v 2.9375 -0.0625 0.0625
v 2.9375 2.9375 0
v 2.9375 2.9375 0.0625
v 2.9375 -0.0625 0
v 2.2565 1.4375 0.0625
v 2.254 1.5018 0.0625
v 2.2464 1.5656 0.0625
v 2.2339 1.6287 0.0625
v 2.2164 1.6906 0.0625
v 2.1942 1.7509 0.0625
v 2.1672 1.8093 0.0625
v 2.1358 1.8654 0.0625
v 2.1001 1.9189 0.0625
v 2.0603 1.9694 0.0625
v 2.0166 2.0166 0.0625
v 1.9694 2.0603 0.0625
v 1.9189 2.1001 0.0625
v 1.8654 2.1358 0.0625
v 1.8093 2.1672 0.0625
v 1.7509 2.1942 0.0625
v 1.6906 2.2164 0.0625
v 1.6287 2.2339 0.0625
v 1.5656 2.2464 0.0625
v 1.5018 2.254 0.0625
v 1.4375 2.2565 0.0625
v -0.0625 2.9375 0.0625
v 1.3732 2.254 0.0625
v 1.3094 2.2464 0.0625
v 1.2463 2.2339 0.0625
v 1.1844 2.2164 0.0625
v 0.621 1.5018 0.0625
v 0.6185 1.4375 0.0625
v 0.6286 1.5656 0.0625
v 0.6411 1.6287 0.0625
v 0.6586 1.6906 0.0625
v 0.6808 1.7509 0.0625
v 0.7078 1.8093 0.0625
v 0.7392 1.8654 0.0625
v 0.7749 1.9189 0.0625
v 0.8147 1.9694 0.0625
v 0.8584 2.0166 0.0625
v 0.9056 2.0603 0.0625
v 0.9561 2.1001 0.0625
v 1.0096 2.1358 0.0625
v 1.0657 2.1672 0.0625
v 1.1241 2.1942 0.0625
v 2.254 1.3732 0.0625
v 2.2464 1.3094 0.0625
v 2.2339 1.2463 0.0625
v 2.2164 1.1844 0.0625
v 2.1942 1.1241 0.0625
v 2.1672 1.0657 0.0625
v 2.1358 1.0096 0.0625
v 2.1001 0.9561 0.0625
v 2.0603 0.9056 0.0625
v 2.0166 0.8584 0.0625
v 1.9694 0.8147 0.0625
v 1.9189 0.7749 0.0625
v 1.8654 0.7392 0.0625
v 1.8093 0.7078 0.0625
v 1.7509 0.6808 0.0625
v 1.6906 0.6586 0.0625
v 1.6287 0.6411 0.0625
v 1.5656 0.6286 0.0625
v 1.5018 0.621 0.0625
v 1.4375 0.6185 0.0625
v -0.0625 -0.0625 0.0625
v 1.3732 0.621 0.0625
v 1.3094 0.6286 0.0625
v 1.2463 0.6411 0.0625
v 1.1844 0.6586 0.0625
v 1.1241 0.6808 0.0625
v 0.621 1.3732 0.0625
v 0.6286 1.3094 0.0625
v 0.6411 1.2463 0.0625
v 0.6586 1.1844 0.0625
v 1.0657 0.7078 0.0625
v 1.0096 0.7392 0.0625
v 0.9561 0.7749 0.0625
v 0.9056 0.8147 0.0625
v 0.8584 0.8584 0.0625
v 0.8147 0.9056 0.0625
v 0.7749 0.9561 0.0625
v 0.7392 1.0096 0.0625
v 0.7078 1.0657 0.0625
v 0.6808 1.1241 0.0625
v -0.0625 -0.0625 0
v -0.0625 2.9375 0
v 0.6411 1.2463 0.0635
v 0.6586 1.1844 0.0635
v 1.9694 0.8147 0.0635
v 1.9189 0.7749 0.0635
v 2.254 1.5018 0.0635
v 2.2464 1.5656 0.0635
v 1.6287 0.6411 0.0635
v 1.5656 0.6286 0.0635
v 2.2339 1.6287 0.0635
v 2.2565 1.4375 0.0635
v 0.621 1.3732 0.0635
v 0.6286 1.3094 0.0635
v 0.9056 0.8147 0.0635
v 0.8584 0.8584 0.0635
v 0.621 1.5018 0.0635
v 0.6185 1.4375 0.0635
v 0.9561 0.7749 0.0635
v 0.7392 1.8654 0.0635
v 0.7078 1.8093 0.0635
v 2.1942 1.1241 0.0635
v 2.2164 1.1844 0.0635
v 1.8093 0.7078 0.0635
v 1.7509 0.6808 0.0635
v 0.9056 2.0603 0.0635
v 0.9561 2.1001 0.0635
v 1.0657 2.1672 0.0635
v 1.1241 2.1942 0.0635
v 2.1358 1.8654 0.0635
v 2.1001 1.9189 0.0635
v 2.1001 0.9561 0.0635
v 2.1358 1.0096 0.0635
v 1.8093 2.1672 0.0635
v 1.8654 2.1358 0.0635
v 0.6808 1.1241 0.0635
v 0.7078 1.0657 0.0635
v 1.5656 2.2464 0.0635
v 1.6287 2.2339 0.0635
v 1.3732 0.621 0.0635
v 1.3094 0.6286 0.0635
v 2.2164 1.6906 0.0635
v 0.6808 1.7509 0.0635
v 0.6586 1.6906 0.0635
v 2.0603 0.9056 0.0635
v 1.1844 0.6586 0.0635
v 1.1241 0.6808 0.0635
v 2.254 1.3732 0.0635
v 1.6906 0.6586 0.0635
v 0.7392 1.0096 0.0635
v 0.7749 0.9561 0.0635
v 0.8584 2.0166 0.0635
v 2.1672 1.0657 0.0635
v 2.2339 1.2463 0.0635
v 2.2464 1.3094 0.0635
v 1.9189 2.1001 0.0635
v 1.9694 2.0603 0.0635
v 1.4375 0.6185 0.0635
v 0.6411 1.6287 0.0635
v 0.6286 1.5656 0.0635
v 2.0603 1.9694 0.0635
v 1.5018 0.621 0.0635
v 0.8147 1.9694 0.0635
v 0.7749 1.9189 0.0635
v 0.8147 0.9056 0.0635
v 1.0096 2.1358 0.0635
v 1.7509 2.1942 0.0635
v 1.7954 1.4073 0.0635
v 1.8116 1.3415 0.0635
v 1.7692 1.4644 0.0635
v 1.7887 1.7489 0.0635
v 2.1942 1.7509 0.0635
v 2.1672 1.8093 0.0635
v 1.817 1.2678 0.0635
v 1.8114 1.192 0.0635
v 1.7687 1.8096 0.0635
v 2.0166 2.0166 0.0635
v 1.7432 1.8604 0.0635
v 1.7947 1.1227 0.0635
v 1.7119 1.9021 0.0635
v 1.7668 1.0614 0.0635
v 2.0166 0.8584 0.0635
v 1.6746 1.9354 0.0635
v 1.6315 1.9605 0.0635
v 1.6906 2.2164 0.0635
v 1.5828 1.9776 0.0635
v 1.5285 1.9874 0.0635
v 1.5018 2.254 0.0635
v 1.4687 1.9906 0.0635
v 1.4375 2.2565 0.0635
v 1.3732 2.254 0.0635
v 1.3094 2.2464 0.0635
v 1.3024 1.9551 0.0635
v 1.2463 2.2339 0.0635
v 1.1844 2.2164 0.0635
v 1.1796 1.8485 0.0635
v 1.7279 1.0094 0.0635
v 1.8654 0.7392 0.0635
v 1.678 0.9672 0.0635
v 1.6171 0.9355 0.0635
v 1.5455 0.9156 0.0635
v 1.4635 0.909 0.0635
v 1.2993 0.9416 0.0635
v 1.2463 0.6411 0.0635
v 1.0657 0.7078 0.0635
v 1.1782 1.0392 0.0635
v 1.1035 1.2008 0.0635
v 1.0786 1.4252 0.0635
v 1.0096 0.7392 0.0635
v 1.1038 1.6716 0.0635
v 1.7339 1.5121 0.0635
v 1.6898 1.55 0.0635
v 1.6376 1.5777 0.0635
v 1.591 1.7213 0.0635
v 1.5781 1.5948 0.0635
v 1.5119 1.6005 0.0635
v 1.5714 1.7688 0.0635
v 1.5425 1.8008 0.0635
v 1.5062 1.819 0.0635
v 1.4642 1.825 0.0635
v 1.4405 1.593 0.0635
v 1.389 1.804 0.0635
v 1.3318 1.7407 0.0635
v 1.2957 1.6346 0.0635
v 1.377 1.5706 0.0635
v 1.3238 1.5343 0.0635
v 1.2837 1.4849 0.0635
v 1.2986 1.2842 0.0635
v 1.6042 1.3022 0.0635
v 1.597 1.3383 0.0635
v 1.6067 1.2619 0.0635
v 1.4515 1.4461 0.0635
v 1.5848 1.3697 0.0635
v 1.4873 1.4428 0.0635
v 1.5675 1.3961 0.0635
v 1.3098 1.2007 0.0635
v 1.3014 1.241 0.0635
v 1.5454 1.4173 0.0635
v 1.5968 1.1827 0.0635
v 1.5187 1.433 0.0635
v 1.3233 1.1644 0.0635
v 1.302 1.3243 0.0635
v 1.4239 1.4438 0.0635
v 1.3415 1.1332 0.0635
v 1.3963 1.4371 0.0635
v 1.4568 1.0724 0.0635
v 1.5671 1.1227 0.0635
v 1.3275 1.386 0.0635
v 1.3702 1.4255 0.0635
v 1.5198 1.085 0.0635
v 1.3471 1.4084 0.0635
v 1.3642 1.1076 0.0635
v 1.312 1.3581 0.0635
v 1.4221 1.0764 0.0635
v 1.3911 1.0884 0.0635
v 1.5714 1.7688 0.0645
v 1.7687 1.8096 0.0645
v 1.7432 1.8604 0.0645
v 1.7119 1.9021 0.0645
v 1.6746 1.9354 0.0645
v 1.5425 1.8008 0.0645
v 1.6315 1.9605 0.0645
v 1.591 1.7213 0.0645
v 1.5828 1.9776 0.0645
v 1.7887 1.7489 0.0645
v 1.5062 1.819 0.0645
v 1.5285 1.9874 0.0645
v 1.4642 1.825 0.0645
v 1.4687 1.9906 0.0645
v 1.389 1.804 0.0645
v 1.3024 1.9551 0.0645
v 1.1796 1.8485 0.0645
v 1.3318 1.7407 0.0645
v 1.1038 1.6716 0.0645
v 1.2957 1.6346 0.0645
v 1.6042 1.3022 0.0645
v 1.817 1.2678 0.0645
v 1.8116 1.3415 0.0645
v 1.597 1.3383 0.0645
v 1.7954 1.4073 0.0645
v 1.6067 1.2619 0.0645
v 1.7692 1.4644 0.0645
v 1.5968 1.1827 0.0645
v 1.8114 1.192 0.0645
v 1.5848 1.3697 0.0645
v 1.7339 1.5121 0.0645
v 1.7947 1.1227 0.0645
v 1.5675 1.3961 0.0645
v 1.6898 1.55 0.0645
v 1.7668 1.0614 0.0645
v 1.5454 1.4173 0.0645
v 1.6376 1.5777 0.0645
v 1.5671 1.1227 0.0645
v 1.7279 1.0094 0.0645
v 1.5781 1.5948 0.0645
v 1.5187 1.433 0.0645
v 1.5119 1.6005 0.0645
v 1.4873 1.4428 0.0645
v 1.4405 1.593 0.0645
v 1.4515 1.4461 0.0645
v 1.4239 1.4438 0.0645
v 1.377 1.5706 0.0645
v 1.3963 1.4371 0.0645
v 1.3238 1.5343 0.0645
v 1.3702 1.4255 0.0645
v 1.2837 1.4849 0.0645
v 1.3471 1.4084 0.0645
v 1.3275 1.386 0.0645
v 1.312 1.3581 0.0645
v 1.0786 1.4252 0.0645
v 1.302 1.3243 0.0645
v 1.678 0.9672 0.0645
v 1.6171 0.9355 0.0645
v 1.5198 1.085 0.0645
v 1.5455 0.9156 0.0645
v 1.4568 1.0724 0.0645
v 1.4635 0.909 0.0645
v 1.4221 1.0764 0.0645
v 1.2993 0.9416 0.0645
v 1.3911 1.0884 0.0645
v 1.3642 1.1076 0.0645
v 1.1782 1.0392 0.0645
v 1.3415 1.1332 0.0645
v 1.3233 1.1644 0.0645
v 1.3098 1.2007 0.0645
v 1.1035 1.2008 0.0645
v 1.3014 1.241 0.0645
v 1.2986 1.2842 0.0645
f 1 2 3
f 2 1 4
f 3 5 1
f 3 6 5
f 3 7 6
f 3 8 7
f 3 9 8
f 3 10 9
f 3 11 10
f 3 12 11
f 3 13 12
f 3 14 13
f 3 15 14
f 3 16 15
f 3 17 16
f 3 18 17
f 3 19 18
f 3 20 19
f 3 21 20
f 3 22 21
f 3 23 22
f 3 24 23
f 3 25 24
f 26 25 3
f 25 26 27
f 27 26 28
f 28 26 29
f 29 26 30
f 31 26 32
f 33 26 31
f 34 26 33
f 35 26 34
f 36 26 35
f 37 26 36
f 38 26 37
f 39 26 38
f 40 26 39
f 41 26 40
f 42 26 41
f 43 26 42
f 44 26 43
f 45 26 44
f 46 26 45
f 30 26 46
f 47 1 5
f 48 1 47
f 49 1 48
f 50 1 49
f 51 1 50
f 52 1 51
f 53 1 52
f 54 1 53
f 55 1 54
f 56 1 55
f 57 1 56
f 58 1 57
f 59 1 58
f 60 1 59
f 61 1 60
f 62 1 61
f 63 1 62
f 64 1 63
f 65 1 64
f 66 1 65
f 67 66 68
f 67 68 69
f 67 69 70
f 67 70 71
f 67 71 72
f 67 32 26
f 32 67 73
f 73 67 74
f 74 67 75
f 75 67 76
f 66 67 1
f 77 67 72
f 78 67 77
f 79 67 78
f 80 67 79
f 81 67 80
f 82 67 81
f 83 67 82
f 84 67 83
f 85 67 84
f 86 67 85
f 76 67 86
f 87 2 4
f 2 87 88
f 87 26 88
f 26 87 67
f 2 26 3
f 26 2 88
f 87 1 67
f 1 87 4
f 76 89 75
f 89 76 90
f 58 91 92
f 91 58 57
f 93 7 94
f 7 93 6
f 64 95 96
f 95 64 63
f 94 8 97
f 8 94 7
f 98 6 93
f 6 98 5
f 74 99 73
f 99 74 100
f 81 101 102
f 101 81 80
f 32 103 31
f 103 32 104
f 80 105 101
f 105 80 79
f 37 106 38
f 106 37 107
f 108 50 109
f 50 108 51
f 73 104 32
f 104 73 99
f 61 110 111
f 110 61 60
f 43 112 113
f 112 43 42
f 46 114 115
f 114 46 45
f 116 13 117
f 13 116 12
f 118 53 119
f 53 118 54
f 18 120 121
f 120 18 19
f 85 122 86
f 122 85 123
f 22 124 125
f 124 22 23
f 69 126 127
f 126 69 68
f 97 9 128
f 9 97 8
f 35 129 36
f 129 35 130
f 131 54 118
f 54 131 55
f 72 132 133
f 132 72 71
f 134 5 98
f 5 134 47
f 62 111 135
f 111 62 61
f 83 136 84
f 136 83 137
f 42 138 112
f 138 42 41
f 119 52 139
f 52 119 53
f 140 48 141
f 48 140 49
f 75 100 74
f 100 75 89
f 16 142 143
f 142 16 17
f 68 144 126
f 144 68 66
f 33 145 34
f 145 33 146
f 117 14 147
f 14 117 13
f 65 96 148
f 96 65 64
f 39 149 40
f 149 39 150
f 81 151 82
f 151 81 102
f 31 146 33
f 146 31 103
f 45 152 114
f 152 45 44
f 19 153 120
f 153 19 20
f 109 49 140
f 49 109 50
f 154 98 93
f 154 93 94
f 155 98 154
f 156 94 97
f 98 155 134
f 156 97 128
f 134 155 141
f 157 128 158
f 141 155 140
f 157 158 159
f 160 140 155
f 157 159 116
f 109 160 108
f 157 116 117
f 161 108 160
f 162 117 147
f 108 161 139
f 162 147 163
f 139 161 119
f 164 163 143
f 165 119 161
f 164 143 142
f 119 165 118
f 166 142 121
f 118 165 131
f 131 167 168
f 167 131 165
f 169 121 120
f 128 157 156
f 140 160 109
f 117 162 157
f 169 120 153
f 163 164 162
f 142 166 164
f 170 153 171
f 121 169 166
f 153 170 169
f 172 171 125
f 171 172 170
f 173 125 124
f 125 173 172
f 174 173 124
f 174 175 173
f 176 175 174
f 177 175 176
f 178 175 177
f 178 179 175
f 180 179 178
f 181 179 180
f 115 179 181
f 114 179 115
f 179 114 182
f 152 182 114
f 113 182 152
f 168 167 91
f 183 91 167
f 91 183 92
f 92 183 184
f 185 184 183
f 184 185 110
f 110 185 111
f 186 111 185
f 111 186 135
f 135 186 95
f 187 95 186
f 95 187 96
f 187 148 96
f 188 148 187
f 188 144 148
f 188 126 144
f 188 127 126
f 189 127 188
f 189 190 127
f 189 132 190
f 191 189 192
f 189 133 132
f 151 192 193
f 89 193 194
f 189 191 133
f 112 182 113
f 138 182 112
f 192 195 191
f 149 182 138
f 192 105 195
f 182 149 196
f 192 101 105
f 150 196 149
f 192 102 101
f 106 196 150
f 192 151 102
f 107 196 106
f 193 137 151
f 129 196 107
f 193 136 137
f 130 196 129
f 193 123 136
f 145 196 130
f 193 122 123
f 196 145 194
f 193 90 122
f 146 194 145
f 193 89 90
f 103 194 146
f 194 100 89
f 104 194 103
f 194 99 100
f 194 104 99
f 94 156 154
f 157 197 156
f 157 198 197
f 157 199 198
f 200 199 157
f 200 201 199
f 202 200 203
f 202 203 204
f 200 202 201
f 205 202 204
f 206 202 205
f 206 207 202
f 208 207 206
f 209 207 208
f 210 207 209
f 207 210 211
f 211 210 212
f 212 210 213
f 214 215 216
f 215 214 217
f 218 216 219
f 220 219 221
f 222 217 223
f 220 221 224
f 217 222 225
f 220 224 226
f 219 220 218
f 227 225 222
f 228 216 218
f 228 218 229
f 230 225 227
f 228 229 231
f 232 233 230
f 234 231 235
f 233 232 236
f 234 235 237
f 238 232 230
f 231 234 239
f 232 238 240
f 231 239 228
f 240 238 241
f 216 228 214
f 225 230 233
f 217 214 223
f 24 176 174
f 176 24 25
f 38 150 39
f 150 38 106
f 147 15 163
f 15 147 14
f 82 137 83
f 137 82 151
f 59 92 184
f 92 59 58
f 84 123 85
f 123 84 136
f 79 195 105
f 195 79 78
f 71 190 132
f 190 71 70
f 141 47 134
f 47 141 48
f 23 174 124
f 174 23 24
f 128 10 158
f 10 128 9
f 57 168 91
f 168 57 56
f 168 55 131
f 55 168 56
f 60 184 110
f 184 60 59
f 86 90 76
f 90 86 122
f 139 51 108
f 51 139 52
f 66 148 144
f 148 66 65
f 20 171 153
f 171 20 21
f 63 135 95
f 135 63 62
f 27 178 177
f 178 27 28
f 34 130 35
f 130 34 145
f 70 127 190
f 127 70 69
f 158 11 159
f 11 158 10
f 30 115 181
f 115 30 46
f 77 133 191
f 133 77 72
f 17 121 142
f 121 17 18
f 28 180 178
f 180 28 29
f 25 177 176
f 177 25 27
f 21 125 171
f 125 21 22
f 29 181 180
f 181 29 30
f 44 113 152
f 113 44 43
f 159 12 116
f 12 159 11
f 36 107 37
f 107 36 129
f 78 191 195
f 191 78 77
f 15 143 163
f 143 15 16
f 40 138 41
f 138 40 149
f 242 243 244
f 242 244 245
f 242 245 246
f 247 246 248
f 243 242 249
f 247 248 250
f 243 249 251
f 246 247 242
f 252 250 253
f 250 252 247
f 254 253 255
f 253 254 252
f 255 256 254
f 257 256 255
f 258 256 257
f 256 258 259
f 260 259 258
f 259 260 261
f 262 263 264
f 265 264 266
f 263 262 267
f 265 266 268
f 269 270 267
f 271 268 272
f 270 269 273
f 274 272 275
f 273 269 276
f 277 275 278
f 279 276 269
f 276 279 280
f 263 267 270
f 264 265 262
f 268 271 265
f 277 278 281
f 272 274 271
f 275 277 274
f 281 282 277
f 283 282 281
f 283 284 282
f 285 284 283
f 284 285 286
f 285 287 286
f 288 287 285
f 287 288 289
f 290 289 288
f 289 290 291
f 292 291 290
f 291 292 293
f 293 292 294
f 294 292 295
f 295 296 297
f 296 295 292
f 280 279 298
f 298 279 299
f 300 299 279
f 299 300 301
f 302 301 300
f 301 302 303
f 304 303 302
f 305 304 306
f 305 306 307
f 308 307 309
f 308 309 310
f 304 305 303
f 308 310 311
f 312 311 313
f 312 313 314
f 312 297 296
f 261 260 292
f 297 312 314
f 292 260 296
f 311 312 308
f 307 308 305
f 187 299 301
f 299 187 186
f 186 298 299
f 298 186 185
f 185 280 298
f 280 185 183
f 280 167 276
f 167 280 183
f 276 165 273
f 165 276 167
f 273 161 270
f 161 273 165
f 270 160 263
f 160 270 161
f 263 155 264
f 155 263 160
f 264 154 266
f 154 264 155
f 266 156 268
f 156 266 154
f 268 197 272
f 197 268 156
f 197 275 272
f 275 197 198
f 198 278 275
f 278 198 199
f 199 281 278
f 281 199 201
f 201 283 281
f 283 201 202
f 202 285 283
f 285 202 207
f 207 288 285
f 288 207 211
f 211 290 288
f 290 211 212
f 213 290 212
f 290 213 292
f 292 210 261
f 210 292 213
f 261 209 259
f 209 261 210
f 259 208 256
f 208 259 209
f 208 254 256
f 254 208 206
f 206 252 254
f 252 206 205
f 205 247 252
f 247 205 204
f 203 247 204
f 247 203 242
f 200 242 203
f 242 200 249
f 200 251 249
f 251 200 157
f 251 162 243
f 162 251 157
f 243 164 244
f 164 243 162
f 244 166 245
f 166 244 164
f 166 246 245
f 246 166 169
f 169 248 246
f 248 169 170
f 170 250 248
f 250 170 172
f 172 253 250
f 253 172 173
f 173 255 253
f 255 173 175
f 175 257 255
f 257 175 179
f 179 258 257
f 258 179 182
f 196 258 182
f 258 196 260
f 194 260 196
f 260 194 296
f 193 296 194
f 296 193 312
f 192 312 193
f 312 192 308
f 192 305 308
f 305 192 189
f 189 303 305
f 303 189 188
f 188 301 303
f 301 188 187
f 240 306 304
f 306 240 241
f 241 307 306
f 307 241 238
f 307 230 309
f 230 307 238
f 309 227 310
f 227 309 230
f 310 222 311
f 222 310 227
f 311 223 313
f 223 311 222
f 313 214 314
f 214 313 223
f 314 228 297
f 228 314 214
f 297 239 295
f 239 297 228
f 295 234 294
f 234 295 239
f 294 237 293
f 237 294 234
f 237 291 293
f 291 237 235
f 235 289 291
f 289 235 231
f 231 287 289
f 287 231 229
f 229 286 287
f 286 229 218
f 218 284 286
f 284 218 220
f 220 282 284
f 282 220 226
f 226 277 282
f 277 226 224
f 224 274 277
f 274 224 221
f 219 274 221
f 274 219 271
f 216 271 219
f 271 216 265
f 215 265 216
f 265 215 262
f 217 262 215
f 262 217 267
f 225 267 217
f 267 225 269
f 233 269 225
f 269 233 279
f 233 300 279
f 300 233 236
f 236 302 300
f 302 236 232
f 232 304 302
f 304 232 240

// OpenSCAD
// element110.scad
// Spur gear tile — centered black gear ring with trapezoidal teeth.
// The open bore reveals a lighter interior (gear_bore module).
// Units: inches

plate_w = 2 + 7/8;
plate_d = 2 + 7/8;
plate_h = 1/16;
frame_w = 1/16;

hole_d = 3/32;
hole_r = hole_d / 2;

// Gear geometry — centered on tile
gear_n      = 20;    // number of teeth
gear_r_tip  = 1.18;  // outer radius at tooth tips
gear_r_root = 1.00;  // root radius at base of teeth
gear_r_bore = 0.82;  // bore (inner hole) radius
tooth_hw    = 4.5;   // half-angle of each tooth in degrees (total = 9°, gap = 9°)
tooth_tip_f = 0.80;  // tooth tip is narrower than base by this factor

// ── Standard modules ─────────────────────────────────────────────────────────

module rivet_holes() {
    spacing_x = plate_w / 10;
    spacing_y = plate_d / 10;
    inset_x   = spacing_x / 2;
    inset_y   = spacing_y / 2;
    // Front edge
    for (i = [0:9])
        translate([inset_x + i * spacing_x, inset_y,         -1])
            cylinder(h = plate_h + 2, r = hole_r, $fn = 20);
    // Back edge
    for (i = [0:9])
        translate([inset_x + i * spacing_x, plate_d - inset_y, -1])
            cylinder(h = plate_h + 2, r = hole_r, $fn = 20);
    // Left edge
    for (i = [0:9])
        translate([inset_x,           inset_y + i * spacing_y, -1])
            cylinder(h = plate_h + 2, r = hole_r, $fn = 20);
    // Right edge
    for (i = [0:9])
        translate([plate_w - inset_x, inset_y + i * spacing_y, -1])
            cylinder(h = plate_h + 2, r = hole_r, $fn = 20);
}

module frame() {
    color("black")
    difference() {
        translate([-frame_w, -frame_w, 0])
            cube([plate_w + 2 * frame_w, plate_d + 2 * frame_w, plate_h]);
        translate([0, 0, -0.001])
            cube([plate_w, plate_d, plate_h + 0.002]);
    }
}

module plate() {
    difference() {
        color("darkgray")
            cube([plate_w, plate_d, plate_h]);
        rivet_holes();
    }
}

rivet_h = plate_h;
module rivets() {
    spacing_x = plate_w / 10;
    spacing_y = plate_d / 10;
    inset_x   = spacing_x / 2;
    inset_y   = spacing_y / 2;
    color("lightgray") {
        for (i = [0:9])
            translate([inset_x + i * spacing_x, inset_y,         0])
                cylinder(h = rivet_h, r = hole_r, $fn = 20);
        for (i = [0:9])
            translate([inset_x + i * spacing_x, plate_d - inset_y, 0])
                cylinder(h = rivet_h, r = hole_r, $fn = 20);
        for (i = [0:9])
            translate([inset_x,           inset_y + i * spacing_y, 0])
                cylinder(h = rivet_h, r = hole_r, $fn = 20);
        for (i = [0:9])
            translate([plate_w - inset_x, inset_y + i * spacing_y, 0])
                cylinder(h = rivet_h, r = hole_r, $fn = 20);
    }
}

// ── Gear modules ─────────────────────────────────────────────────────────────

// Single trapezoidal tooth pointing in +x direction (before rotation)
module gear_tooth_2d() {
    polygon([
        [gear_r_root * cos(-tooth_hw),             gear_r_root * sin(-tooth_hw)],
        [gear_r_tip  * cos(-tooth_hw * tooth_tip_f), gear_r_tip  * sin(-tooth_hw * tooth_tip_f)],
        [gear_r_tip  * cos( tooth_hw * tooth_tip_f), gear_r_tip  * sin( tooth_hw * tooth_tip_f)],
        [gear_r_root * cos( tooth_hw),             gear_r_root * sin( tooth_hw)],
    ]);
}

// Full 2D gear profile (ring + teeth, without bore subtracted)
module gear_2d() {
    pitch = 360 / gear_n;
    union() {
        circle(r = gear_r_root, $fn = gear_n * 8);
        for (i = [0:gear_n - 1])
            rotate([0, 0, i * pitch])
                gear_tooth_2d();
    }
}

// Black gear ring + teeth with open bore
module gear() {
    color("black")
    translate([plate_w / 2, plate_d / 2, 0])
    linear_extrude(plate_h)
    difference() {
        gear_2d();
        circle(r = gear_r_bore, $fn = 80);
    }
}

// Lighter fill inside the bore (silver interior visible through center)
module gear_bore() {
    color([0.80, 0.80, 0.80])
    translate([plate_w / 2, plate_d / 2, 0])
    linear_extrude(plate_h + 0.001)
    circle(r = gear_r_bore - 0.001, $fn = 80);
}

// Green "1" centered inside the bore
module gear_label() {
    color("green")
    translate([plate_w / 2, plate_d / 2, 0])
    linear_extrude(plate_h + 0.002)
    text("6", size = 1.1, halign = "center", valign = "center",
         font = "Liberation Sans:style=Bold");
}

// ── Assembly ─────────────────────────────────────────────────────────────────

frame();
plate();
rivets();
gear_bore();
gear();
gear_label();
